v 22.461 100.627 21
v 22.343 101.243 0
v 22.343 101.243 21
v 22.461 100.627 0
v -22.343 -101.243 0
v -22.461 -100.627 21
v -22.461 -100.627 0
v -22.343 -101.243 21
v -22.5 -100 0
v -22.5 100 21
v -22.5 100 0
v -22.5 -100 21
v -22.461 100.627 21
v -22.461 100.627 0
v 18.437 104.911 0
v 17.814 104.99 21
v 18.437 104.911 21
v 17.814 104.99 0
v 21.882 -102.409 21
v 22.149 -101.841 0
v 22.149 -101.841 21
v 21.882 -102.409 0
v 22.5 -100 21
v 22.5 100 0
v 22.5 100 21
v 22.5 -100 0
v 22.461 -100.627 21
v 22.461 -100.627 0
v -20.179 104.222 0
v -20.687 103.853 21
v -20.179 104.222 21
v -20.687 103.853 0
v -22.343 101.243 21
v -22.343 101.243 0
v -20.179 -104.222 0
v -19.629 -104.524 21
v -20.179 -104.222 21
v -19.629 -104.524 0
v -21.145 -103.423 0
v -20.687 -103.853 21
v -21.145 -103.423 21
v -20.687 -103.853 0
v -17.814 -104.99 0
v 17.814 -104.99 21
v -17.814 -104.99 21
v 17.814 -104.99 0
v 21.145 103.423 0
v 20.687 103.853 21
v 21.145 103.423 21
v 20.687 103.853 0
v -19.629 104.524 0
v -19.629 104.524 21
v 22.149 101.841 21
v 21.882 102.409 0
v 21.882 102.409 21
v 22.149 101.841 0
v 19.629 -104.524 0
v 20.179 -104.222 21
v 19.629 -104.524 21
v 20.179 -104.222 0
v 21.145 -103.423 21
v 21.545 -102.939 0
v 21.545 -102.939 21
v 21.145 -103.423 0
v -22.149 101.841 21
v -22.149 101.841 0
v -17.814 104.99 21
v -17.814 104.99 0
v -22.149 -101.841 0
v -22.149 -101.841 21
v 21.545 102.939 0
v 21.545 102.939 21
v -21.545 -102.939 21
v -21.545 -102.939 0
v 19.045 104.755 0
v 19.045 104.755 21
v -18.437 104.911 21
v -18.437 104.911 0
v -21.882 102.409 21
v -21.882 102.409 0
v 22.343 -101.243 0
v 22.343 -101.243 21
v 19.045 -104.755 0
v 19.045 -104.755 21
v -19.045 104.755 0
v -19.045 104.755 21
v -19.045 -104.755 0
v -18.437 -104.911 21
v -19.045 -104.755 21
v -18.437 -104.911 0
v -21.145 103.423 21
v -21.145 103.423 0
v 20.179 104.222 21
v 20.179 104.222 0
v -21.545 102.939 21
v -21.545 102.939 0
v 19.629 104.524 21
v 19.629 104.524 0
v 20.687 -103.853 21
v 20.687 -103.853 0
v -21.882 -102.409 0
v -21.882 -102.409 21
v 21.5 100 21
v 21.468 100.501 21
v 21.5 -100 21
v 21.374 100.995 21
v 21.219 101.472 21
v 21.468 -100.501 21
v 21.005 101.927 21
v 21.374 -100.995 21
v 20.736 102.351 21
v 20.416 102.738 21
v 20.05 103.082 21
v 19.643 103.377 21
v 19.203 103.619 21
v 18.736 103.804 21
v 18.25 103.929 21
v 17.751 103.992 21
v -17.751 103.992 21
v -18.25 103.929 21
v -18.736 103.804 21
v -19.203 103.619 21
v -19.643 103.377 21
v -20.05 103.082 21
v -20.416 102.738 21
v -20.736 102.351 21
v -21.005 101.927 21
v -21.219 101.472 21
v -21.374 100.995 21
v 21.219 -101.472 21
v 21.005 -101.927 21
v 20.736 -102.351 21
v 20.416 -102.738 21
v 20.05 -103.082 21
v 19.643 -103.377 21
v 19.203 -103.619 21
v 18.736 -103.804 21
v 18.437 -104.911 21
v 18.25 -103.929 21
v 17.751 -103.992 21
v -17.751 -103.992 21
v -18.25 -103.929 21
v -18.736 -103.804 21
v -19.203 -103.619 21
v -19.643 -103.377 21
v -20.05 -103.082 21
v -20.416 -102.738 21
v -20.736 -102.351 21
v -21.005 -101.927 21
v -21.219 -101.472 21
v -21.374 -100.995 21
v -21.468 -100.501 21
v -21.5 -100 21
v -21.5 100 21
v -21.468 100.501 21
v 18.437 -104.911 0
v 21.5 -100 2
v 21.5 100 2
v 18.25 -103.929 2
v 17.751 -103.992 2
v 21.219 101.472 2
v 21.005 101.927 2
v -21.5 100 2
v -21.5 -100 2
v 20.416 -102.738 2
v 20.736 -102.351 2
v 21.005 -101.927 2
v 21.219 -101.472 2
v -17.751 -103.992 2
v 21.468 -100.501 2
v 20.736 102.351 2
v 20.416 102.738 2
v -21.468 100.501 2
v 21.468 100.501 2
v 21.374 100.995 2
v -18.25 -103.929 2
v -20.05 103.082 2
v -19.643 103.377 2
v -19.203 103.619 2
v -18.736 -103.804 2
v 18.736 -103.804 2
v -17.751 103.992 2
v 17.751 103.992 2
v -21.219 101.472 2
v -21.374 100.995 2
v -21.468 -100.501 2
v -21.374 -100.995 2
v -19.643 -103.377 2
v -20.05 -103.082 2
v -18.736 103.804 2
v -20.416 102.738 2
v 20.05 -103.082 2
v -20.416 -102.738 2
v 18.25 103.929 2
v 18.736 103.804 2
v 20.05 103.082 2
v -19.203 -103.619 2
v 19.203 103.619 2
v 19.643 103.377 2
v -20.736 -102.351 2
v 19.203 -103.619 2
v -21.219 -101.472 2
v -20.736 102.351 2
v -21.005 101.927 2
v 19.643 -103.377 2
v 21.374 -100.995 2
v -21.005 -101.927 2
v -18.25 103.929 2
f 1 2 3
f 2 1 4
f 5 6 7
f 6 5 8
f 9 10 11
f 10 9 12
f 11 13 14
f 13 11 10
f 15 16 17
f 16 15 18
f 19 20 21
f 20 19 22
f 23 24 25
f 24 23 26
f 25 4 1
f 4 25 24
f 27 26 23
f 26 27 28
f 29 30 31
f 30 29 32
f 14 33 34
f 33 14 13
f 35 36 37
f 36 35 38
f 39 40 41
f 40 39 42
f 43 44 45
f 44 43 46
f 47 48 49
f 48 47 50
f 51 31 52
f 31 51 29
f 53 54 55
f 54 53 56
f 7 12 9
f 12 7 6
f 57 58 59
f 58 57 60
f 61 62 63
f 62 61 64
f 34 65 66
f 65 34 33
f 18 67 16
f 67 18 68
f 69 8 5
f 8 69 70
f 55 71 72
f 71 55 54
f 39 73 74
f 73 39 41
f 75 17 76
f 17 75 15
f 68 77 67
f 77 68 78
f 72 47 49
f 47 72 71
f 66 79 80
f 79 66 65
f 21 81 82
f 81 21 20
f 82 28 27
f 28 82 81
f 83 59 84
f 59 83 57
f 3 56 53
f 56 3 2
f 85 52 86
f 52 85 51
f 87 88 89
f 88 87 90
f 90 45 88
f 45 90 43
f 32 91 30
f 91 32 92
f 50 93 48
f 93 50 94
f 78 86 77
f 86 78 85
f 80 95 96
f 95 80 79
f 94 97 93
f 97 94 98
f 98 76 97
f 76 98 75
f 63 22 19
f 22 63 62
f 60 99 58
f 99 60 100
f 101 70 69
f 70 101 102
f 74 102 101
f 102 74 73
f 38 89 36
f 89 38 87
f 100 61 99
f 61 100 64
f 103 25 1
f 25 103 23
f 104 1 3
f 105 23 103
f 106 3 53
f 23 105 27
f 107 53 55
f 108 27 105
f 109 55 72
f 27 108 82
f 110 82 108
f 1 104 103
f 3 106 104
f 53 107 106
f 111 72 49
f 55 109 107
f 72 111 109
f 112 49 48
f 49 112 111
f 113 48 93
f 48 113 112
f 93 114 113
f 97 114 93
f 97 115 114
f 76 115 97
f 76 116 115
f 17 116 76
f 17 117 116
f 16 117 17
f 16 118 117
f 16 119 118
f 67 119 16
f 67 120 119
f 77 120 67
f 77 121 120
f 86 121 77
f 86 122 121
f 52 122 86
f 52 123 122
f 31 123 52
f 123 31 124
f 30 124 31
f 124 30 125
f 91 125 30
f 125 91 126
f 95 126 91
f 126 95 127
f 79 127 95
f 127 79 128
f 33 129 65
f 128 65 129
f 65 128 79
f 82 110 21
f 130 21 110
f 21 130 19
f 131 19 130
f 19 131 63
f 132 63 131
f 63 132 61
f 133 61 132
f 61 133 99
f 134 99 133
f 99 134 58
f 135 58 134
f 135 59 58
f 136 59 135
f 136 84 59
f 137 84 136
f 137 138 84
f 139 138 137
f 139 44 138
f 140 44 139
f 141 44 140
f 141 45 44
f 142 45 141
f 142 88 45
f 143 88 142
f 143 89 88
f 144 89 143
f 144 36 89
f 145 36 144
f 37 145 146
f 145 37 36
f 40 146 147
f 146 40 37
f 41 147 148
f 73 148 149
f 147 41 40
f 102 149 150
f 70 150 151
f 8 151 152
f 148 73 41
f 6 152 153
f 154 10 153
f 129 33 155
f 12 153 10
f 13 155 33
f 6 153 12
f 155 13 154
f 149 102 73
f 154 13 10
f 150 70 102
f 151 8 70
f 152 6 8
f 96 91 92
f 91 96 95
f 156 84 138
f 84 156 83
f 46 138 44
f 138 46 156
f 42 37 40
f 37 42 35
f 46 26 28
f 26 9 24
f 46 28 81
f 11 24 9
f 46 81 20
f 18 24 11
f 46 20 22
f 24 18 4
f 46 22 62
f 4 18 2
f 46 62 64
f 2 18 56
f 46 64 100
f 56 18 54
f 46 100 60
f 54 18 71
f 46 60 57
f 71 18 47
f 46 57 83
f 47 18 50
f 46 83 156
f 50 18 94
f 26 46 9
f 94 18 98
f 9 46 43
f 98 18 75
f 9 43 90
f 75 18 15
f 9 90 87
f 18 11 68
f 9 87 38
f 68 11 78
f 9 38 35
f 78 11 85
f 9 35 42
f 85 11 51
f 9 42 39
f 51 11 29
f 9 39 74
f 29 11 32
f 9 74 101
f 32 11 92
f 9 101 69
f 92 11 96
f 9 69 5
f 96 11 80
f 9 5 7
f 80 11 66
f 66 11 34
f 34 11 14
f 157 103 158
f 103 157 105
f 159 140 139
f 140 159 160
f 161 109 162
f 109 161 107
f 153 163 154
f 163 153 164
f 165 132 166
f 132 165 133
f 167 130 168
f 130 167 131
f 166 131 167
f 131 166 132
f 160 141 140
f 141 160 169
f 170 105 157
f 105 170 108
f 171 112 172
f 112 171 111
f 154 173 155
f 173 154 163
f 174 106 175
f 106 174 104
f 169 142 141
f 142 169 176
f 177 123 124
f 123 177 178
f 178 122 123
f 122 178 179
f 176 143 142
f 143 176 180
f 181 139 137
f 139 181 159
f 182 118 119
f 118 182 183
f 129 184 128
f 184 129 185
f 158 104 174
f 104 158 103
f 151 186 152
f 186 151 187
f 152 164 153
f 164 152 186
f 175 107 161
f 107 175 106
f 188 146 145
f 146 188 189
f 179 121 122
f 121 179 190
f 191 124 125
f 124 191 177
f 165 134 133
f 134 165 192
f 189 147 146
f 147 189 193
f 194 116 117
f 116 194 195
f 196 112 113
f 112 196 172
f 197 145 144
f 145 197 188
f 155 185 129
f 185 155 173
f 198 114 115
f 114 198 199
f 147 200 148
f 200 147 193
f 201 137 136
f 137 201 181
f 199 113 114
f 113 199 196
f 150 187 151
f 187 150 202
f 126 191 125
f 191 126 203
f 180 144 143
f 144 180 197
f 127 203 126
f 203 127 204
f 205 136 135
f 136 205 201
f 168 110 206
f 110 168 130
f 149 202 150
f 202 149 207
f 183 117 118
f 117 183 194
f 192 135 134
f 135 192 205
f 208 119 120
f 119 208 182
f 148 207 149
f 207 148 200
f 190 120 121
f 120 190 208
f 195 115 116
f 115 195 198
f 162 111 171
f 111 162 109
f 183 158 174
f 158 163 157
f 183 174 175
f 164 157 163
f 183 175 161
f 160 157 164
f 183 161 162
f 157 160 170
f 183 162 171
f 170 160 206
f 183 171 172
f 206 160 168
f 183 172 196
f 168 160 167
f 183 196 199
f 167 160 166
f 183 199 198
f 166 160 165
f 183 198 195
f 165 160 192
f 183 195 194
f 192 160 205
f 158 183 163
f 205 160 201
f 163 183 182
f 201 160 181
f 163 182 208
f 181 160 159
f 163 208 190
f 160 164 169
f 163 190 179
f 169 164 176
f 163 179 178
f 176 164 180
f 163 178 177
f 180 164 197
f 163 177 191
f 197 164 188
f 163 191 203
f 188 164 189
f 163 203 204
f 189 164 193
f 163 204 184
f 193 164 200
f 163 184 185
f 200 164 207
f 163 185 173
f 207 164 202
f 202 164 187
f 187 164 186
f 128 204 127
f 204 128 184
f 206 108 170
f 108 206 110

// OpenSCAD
$fn = 50;


difference() {
	union() {
		hull() {
			translate(v = [-17.5000000000, 100.0000000000, 0]) {
				cylinder(h = 21, r = 5);
			}
			translate(v = [17.5000000000, 100.0000000000, 0]) {
				cylinder(h = 21, r = 5);
			}
			translate(v = [-17.5000000000, -100.0000000000, 0]) {
				cylinder(h = 21, r = 5);
			}
			translate(v = [17.5000000000, -100.0000000000, 0]) {
				cylinder(h = 21, r = 5);
			}
		}
	}
	union() {
		translate(v = [0, 0, 2]) {
			hull() {
				translate(v = [-17.5000000000, 100.0000000000, 0]) {
					cylinder(h = 19, r = 4);
				}
				translate(v = [17.5000000000, 100.0000000000, 0]) {
					cylinder(h = 19, r = 4);
				}
				translate(v = [-17.5000000000, -100.0000000000, 0]) {
					cylinder(h = 19, r = 4);
				}
				translate(v = [17.5000000000, -100.0000000000, 0]) {
					cylinder(h = 19, r = 4);
				}
			}
		}
	}
}
